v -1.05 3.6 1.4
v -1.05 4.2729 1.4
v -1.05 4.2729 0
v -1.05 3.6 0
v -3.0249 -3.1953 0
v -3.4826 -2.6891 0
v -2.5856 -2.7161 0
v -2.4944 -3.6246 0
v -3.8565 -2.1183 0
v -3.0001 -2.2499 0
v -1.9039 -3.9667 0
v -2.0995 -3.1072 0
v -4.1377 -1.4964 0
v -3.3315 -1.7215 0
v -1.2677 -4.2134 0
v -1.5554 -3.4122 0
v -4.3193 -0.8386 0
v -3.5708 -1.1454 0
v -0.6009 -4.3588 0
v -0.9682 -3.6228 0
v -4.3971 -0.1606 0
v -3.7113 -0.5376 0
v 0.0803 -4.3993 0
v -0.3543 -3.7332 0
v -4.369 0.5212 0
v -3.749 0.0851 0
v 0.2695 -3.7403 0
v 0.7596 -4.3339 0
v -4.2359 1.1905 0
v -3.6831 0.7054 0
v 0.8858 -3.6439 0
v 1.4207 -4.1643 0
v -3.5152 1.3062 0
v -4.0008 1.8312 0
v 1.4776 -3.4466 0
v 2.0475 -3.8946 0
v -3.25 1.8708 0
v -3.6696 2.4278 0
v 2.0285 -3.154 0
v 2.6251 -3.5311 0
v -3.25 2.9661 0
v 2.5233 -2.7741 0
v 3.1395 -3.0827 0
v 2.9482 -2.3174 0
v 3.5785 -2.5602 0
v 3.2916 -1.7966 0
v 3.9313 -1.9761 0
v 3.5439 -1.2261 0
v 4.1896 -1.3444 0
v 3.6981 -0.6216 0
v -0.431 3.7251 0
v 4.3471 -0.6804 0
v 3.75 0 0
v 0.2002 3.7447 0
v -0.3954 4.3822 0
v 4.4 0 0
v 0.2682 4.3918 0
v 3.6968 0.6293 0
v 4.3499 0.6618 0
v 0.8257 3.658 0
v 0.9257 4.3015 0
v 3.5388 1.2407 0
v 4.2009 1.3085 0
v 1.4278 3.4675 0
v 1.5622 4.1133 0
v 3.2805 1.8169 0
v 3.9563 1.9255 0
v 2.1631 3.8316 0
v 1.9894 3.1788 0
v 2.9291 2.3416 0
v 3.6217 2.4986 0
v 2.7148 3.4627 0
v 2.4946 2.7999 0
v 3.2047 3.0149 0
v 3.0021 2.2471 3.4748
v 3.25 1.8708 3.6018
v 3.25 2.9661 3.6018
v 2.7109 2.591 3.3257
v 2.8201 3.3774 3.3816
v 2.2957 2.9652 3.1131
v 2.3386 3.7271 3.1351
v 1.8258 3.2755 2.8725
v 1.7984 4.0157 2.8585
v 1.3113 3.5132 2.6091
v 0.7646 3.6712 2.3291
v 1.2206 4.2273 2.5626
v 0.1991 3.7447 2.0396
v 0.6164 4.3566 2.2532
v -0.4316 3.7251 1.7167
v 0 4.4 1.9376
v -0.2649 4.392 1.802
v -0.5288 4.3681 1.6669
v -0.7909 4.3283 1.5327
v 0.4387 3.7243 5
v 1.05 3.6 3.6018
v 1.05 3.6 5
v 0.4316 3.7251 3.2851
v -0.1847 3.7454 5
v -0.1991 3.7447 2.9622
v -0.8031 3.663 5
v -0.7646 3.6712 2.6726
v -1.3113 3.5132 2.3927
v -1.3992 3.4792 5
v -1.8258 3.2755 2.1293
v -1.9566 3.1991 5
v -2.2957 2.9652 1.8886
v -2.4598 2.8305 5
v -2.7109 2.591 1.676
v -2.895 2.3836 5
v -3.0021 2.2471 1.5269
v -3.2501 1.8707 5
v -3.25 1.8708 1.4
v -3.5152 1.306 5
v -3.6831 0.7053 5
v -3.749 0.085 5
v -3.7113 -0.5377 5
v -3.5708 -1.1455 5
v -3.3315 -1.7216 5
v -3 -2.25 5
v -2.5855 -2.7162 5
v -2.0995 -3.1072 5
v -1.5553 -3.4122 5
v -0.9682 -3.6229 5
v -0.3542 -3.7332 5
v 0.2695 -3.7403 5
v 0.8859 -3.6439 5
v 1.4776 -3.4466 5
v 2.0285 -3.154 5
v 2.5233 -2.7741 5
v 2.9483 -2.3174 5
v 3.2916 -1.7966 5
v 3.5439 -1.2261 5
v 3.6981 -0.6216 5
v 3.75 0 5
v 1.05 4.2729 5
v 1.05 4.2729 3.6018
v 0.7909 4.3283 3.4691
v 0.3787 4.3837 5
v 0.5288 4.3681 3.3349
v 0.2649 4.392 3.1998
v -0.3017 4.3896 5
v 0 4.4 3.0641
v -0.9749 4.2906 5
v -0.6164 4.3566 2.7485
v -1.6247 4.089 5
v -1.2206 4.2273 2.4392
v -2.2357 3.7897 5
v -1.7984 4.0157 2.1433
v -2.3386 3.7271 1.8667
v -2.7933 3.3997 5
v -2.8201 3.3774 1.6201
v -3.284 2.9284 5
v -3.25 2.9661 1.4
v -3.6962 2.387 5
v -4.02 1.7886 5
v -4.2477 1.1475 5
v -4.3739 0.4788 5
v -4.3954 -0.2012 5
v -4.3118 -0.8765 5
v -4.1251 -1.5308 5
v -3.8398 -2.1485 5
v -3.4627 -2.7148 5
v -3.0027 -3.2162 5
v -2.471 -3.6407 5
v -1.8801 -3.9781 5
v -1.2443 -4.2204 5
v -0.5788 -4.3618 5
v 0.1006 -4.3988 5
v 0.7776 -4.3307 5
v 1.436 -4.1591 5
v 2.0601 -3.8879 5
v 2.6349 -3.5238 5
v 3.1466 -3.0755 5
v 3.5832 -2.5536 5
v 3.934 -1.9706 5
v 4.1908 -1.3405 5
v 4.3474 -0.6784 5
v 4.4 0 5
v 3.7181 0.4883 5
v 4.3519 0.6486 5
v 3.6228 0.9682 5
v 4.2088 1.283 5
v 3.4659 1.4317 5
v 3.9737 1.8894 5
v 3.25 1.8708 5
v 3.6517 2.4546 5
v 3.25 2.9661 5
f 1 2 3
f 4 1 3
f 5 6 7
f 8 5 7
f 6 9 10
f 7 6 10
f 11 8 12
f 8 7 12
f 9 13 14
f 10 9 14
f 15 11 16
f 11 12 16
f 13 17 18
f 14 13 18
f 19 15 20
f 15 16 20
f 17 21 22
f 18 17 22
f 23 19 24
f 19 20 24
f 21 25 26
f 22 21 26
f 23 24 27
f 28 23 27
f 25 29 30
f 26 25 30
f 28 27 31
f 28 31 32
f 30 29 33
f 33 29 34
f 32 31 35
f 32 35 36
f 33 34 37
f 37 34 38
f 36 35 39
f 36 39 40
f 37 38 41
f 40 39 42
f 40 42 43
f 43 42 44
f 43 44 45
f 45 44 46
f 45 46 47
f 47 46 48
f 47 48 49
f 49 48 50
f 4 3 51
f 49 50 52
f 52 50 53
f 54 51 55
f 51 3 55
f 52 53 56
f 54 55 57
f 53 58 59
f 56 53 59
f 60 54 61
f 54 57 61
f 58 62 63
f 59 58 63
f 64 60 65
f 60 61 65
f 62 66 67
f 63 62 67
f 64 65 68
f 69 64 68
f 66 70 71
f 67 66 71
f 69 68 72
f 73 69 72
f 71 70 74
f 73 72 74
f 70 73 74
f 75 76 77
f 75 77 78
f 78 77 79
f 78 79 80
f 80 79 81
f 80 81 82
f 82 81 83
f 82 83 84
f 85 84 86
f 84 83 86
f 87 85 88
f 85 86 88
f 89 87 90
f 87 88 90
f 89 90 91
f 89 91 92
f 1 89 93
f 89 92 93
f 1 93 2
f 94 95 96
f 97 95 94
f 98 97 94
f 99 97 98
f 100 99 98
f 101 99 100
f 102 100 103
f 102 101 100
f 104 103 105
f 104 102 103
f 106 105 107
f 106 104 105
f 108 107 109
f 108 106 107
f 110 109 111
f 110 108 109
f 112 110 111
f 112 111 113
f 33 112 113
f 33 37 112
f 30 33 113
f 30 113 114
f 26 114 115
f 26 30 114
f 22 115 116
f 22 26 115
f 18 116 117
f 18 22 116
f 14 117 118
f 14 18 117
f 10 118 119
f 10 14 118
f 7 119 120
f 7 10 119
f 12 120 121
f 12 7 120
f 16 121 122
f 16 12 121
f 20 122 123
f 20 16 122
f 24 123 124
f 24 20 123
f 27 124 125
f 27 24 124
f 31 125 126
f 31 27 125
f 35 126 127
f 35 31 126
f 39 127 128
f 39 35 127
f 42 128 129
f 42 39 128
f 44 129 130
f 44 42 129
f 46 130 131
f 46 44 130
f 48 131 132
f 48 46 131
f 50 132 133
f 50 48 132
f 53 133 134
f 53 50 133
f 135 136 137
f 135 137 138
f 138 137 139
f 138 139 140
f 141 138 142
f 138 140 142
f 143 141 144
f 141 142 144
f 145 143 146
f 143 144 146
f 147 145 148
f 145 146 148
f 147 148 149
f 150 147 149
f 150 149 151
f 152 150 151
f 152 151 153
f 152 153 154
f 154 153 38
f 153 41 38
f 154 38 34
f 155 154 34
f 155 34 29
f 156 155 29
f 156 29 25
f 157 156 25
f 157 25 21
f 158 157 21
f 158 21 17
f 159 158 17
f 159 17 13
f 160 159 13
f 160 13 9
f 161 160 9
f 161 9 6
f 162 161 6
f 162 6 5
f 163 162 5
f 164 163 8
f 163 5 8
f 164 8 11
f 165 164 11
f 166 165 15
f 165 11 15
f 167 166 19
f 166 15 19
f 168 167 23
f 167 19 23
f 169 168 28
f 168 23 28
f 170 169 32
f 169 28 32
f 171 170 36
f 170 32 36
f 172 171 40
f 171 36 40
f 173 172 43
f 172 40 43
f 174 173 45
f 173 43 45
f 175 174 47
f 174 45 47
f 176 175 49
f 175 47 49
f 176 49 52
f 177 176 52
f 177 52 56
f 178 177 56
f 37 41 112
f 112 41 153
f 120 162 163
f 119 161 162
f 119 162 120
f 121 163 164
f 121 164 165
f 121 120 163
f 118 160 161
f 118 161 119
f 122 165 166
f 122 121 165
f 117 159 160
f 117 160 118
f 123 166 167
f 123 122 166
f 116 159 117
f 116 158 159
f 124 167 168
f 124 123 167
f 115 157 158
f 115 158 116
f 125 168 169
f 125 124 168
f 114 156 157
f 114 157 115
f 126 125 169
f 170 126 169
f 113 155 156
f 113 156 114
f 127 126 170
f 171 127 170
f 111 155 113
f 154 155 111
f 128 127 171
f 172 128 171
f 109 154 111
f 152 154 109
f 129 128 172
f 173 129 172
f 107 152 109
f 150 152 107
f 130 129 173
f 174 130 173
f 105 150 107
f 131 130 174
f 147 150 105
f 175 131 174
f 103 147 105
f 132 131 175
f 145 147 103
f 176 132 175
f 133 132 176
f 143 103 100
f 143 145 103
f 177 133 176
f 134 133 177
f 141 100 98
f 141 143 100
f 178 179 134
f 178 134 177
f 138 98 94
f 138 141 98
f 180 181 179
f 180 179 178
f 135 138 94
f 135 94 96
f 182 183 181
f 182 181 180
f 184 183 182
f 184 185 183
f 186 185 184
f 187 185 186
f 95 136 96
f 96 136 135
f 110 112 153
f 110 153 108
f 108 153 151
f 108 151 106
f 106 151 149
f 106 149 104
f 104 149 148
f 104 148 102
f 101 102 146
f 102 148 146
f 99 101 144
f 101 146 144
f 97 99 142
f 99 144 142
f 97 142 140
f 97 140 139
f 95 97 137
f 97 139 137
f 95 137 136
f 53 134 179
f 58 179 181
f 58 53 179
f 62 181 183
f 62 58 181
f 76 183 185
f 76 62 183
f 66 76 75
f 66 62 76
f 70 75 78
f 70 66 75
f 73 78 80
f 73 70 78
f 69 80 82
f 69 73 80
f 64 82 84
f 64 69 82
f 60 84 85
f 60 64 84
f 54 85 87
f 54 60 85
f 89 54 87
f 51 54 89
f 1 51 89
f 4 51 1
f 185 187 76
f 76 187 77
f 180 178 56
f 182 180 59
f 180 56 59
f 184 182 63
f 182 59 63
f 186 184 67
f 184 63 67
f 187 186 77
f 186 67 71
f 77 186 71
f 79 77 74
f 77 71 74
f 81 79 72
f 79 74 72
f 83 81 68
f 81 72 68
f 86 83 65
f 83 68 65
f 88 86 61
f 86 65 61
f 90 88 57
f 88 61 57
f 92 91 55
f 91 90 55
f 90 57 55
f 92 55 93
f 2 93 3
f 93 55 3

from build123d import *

# Parameters (mm, degrees)
SKETCH2_R           = 4.4
SKETCH2_R_2         = 3.75
BOSS_EXTRUDE1_DEPTH = 5
CUT_EXTRUDE1_DEPTH  = 5


with BuildPart() as part:
    # Sketch2 → Boss-Extrude1 (new body)
    with BuildSketch(Plane.XY):
        Circle(SKETCH2_R)
        Circle(SKETCH2_R_2, mode=Mode.SUBTRACT)
    extrude(amount=BOSS_EXTRUDE1_DEPTH)

    # Sketch3 → Cut-Extrude1 (cut)
    with BuildSketch(Plane(origin=(0, 4.4, 0), x_dir=(1, 0, 0), z_dir=(0, 1, 0))):
        Polygon((1.05, -5), (3.25, -5), (3.25, -3.60176001), (-1.05, -1.4), (-1.05, 0), (-3.25, 0), (-3.25, -1.4), (1.05, -3.60176001), align=None)
    extrude(amount=-CUT_EXTRUDE1_DEPTH, mode=Mode.SUBTRACT)


solid = part.part
